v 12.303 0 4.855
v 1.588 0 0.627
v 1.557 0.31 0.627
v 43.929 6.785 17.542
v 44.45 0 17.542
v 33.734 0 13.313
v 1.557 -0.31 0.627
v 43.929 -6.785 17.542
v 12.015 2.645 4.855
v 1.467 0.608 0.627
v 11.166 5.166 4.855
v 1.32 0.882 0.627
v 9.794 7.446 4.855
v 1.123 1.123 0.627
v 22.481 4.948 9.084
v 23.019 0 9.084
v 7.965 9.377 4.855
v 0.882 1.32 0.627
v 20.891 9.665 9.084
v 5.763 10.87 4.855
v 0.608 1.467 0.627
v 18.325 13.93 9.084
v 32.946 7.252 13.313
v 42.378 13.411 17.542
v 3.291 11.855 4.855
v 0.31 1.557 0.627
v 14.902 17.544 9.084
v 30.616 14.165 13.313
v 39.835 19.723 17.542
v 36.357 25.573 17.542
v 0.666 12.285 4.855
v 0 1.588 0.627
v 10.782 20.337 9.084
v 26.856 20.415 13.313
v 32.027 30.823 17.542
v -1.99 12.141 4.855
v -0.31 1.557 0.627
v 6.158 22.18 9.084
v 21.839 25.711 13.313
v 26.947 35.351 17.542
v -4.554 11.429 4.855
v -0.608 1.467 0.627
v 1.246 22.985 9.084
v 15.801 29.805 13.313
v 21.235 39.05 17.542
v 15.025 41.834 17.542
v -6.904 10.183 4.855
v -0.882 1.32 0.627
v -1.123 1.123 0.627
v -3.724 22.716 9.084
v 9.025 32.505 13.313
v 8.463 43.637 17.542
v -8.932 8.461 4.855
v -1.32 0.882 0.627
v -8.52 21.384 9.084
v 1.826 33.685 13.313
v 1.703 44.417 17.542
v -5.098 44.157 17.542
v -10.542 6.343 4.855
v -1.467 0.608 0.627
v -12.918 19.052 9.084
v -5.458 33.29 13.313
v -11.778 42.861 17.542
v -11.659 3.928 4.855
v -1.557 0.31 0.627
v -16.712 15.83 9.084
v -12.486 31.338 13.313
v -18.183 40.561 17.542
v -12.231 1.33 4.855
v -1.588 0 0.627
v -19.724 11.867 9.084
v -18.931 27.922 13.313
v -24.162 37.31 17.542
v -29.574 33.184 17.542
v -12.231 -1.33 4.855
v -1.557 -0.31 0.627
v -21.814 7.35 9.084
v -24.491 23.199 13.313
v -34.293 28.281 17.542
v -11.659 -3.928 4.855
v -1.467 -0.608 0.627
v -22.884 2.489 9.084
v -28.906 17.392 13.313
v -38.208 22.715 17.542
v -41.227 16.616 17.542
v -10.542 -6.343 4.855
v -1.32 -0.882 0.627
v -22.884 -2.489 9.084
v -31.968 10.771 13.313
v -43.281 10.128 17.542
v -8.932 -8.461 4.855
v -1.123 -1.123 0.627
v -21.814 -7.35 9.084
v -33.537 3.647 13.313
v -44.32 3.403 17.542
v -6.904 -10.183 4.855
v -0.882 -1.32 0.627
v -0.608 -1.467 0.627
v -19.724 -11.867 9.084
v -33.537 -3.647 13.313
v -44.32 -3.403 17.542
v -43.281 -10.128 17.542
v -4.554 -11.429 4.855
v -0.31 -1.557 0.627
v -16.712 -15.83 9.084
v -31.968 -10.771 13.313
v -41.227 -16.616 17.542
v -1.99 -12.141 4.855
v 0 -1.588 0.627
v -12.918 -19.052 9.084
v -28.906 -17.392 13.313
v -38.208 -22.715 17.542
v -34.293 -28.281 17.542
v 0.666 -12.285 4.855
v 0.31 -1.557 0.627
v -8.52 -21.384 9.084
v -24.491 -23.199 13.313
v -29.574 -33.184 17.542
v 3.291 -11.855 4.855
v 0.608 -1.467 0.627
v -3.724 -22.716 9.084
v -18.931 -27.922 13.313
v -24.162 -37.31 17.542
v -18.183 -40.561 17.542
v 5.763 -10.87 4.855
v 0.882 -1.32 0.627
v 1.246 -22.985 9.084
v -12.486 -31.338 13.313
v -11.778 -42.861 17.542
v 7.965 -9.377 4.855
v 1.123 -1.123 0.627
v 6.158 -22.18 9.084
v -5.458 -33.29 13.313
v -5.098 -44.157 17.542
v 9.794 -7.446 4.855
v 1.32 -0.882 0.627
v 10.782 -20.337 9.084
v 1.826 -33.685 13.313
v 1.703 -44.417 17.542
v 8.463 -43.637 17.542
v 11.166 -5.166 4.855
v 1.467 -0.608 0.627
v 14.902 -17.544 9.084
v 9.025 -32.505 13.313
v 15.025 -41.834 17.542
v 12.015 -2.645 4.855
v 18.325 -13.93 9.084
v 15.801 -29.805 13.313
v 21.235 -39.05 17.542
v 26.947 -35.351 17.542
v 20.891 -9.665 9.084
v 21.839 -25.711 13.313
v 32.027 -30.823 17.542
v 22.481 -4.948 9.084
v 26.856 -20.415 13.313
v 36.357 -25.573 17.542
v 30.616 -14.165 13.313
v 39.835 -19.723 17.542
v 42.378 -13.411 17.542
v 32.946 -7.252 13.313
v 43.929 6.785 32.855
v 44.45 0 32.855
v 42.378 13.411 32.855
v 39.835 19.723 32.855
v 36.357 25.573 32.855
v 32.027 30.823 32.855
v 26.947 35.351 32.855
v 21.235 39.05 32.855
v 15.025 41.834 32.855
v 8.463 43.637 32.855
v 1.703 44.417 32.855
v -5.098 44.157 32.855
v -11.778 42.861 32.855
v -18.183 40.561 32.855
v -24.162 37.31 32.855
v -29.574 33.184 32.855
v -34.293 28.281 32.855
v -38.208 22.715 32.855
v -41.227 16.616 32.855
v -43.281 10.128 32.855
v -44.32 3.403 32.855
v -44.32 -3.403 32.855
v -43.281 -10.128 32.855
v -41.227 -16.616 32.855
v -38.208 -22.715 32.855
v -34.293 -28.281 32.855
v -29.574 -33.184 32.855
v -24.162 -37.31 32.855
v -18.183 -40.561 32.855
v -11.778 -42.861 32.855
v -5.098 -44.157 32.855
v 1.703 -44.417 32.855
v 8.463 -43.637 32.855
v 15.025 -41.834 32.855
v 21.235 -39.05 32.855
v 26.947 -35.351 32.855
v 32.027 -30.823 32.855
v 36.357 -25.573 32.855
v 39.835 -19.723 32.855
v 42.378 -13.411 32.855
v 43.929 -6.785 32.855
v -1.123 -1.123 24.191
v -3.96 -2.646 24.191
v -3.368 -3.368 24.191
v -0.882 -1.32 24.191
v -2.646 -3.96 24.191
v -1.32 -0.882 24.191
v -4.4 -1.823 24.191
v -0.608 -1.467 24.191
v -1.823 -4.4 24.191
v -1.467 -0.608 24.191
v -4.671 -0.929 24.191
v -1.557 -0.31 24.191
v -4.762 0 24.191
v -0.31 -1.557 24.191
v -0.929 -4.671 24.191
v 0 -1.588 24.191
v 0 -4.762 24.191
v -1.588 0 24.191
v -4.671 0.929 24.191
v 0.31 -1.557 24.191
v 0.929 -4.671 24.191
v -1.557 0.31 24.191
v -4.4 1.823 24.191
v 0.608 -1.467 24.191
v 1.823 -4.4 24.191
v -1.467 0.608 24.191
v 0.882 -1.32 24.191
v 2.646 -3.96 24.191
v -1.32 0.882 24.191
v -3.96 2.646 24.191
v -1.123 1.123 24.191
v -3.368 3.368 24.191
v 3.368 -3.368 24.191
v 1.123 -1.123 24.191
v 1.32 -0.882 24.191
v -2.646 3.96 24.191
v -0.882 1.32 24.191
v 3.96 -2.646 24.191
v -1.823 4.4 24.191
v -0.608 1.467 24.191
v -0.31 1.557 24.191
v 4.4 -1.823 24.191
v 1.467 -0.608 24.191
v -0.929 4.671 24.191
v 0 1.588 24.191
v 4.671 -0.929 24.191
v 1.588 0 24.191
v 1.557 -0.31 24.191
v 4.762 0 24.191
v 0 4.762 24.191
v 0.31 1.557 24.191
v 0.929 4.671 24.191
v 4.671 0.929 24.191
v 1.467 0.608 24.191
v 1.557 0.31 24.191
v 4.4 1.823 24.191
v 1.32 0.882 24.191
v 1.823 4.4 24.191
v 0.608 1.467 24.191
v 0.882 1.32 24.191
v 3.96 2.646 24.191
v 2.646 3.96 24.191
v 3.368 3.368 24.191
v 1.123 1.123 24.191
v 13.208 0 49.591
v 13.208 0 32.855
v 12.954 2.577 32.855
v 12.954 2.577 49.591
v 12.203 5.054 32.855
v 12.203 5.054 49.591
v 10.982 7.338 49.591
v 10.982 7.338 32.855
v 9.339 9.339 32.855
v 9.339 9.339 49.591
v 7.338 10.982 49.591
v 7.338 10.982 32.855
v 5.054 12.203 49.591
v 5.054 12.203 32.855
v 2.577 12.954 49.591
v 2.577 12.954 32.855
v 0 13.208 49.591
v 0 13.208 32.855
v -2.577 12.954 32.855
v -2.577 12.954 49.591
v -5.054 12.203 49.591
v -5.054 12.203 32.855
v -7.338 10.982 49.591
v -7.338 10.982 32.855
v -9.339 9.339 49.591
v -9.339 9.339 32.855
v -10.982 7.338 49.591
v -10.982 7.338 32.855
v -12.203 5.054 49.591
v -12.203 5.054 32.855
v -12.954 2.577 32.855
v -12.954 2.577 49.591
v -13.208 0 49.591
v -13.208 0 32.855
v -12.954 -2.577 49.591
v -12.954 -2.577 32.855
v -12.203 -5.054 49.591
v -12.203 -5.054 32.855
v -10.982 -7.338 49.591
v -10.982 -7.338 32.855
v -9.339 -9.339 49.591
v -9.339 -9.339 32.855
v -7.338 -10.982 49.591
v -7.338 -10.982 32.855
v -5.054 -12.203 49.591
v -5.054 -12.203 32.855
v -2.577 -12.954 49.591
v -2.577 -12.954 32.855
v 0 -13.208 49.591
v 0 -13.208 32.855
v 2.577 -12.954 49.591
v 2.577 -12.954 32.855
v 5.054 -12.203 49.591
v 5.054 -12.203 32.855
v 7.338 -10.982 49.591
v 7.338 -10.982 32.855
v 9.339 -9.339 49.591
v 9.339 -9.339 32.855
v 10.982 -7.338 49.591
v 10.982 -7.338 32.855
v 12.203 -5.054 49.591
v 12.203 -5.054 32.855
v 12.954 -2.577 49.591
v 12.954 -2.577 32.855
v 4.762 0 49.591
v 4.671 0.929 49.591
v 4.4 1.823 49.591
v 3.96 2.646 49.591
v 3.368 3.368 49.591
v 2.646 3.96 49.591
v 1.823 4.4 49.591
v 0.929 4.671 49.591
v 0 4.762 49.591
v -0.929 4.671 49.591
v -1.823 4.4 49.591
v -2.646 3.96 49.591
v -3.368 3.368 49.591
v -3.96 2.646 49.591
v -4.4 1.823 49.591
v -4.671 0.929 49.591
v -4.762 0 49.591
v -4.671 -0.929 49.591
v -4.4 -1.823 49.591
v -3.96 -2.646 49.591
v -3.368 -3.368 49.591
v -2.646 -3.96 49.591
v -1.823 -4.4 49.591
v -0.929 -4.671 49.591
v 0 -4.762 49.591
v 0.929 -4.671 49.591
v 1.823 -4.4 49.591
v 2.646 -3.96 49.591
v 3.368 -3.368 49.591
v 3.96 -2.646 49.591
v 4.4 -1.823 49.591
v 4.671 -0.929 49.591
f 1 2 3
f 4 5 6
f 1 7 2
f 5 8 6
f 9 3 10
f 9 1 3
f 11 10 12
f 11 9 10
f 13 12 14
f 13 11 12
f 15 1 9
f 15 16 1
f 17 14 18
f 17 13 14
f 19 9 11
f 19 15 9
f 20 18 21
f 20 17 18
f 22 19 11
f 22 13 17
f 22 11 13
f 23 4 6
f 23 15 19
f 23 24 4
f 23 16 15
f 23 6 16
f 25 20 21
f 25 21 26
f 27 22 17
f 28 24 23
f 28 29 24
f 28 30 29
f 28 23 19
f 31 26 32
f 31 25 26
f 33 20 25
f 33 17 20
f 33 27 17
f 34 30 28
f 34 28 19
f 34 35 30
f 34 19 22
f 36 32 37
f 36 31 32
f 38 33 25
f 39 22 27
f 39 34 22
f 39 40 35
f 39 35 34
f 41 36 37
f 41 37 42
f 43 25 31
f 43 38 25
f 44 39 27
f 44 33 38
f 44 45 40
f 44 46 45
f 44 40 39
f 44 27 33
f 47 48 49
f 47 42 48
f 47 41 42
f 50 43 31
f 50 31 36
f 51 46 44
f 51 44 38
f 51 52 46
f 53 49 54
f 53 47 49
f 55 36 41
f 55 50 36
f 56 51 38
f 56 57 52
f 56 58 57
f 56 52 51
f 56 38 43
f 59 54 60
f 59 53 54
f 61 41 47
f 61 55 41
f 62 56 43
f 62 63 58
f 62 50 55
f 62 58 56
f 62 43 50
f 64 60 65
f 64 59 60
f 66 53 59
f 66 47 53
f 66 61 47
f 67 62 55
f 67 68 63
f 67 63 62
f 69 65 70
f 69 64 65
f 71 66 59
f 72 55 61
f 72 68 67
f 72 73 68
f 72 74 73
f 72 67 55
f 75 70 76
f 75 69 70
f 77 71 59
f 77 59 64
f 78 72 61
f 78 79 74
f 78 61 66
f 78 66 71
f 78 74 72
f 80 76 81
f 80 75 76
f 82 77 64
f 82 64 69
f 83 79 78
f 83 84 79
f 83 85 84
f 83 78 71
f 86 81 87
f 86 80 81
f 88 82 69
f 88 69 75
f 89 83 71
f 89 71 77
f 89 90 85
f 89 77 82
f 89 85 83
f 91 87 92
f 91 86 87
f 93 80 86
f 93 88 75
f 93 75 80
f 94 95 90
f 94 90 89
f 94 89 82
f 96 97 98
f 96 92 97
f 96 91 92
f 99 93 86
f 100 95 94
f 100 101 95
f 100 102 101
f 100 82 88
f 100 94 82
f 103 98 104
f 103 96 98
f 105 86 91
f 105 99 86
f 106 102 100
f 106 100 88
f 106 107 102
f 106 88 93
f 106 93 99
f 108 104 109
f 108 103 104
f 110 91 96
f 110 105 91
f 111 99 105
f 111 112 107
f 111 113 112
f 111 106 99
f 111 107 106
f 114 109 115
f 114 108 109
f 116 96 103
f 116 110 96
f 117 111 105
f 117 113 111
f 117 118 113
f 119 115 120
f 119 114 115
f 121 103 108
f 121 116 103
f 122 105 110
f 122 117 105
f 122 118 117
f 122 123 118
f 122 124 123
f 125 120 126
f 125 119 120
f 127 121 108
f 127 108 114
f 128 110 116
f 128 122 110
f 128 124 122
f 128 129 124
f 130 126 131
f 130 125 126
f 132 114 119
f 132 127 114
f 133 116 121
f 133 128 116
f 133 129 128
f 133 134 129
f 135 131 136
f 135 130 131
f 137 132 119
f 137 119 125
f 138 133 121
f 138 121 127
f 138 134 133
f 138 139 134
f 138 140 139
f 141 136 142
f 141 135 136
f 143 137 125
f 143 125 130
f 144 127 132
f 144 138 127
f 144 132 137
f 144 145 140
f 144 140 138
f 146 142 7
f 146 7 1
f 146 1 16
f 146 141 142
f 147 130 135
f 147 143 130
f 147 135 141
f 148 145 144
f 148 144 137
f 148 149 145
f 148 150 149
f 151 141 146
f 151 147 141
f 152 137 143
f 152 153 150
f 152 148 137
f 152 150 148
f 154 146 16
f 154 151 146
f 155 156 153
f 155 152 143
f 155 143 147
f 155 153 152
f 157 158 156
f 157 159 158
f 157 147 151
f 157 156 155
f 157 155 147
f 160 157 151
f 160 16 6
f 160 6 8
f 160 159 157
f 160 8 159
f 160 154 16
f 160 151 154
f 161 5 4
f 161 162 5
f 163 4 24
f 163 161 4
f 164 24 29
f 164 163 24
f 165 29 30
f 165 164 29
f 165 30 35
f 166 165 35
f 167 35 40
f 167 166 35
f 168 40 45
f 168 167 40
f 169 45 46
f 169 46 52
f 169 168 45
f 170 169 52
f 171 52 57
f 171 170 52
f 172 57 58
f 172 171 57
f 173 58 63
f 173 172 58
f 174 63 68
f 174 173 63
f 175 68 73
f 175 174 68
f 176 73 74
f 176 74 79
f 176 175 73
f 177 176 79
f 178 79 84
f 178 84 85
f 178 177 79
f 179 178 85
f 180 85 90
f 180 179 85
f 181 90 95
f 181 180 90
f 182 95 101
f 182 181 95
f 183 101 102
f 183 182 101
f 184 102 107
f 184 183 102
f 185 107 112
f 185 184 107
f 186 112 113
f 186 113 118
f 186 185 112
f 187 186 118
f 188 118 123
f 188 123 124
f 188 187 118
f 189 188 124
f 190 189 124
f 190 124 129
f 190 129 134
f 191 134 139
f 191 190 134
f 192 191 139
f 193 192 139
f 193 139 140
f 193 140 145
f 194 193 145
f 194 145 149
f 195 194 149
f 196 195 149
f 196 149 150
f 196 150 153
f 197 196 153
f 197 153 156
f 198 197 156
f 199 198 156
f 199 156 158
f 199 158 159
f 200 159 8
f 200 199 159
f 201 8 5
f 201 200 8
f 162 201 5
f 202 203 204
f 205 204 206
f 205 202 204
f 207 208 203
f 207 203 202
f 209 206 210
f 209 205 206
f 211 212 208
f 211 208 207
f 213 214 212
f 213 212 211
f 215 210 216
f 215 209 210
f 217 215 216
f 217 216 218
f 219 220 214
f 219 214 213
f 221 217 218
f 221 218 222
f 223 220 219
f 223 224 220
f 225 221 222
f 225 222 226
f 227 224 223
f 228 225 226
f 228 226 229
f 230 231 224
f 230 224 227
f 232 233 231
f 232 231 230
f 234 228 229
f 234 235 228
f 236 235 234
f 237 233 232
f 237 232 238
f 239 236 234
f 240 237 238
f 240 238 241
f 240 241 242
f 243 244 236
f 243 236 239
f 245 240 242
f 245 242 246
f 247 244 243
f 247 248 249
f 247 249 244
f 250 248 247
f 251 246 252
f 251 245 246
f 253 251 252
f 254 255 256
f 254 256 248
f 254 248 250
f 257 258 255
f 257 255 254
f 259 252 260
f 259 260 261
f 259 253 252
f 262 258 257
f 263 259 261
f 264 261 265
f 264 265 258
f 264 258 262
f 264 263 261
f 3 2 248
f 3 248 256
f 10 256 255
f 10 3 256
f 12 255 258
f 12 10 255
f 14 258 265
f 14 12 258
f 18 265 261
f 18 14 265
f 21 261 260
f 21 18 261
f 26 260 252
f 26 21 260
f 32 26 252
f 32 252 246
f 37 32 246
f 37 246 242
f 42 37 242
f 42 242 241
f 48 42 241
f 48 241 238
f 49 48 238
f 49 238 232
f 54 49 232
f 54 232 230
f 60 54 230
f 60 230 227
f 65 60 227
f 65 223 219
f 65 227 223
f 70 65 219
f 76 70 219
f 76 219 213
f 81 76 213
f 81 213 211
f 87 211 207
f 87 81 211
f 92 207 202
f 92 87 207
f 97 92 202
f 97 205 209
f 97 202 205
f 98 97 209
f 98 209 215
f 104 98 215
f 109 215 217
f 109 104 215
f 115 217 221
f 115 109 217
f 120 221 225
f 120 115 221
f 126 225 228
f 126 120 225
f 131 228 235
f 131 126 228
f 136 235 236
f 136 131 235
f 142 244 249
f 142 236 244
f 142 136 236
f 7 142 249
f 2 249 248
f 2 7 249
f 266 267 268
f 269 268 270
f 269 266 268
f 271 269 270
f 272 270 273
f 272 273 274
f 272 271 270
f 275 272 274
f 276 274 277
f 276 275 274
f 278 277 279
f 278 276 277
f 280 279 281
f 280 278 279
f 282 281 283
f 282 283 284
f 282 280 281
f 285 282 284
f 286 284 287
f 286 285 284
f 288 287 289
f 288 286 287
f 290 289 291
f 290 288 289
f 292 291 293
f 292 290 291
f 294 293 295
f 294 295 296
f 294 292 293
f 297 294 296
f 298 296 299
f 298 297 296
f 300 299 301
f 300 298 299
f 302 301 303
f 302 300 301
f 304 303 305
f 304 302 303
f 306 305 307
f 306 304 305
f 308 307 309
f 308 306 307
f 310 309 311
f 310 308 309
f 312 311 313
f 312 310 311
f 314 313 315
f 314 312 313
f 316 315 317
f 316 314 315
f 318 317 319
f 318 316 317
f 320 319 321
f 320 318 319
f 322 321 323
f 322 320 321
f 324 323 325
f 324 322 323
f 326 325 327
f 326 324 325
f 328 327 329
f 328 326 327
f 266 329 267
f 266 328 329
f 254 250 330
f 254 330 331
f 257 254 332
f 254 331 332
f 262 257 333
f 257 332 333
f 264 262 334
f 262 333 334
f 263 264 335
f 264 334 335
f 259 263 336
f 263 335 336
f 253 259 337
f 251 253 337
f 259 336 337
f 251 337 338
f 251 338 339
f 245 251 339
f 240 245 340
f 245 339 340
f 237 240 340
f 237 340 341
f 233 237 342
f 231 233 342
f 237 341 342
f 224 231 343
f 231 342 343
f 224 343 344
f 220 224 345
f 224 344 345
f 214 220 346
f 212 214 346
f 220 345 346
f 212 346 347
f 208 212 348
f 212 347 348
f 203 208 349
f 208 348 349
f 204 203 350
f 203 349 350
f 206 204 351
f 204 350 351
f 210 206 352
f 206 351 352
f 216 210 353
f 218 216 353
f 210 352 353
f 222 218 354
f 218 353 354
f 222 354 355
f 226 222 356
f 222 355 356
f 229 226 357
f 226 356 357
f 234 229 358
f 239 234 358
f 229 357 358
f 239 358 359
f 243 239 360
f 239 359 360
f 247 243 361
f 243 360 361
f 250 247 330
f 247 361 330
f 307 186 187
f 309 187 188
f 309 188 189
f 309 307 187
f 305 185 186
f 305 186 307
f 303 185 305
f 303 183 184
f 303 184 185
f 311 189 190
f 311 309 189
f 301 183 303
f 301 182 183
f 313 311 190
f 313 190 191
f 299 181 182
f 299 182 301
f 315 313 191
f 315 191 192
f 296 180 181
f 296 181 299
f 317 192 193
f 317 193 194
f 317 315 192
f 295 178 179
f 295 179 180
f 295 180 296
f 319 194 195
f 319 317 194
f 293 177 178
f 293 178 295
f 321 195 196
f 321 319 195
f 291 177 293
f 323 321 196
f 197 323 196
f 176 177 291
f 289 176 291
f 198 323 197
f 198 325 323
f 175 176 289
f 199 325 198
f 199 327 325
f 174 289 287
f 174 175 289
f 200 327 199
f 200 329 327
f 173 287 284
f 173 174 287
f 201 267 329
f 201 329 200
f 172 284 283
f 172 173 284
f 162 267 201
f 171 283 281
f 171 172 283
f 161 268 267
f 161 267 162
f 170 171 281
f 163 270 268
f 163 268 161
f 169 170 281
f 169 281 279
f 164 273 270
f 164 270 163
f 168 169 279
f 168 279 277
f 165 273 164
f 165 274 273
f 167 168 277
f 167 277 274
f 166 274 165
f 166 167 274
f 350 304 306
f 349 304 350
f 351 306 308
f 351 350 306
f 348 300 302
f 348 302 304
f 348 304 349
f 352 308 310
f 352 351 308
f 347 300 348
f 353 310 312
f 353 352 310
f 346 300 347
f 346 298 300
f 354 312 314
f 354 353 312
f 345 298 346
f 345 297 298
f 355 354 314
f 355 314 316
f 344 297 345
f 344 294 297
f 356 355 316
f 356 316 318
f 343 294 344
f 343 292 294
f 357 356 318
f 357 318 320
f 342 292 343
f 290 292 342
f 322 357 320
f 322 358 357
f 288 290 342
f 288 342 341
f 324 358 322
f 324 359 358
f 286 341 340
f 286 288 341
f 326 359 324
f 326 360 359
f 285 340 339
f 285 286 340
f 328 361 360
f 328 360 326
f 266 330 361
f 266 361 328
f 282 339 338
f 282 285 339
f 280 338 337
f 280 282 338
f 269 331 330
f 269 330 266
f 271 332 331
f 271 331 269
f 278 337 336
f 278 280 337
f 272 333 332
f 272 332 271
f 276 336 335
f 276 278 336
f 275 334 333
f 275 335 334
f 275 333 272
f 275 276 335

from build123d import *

# Parameters (mm, degrees)
F2_R     = 4.7625
F4_DEPTH = 25.4
F5_R     = 1.5875
F6_DEPTH = 25.4


with BuildPart() as f1:
    # F0 (on Front) → F1 (revolve)
    with BuildSketch(Plane.XZ):
        Polygon((0, 24.795596), (0, 0), (44.45, 17.542299), (44.45, 24.795596), align=None)
        Polygon((0, 49.591192), (0, 24.795596), (44.45, 24.795596), (44.45, 32.854902), (13.208, 32.854902), (13.208, 49.591192), align=None)
    revolve(axis=Axis((0, 0, 24.795596), (0, 0, 1)))

    # F2 (on face) → F4 (cut)
    with BuildSketch(Plane.XY.offset(49.591192)):
        Circle(F2_R)
    extrude(amount=-F4_DEPTH, mode=Mode.SUBTRACT)

    # F5 (on Top) → F6 (cut)
    with BuildSketch(Plane.XY):
        Circle(F5_R)
    extrude(amount=F6_DEPTH, mode=Mode.SUBTRACT)


solid = f1.part
